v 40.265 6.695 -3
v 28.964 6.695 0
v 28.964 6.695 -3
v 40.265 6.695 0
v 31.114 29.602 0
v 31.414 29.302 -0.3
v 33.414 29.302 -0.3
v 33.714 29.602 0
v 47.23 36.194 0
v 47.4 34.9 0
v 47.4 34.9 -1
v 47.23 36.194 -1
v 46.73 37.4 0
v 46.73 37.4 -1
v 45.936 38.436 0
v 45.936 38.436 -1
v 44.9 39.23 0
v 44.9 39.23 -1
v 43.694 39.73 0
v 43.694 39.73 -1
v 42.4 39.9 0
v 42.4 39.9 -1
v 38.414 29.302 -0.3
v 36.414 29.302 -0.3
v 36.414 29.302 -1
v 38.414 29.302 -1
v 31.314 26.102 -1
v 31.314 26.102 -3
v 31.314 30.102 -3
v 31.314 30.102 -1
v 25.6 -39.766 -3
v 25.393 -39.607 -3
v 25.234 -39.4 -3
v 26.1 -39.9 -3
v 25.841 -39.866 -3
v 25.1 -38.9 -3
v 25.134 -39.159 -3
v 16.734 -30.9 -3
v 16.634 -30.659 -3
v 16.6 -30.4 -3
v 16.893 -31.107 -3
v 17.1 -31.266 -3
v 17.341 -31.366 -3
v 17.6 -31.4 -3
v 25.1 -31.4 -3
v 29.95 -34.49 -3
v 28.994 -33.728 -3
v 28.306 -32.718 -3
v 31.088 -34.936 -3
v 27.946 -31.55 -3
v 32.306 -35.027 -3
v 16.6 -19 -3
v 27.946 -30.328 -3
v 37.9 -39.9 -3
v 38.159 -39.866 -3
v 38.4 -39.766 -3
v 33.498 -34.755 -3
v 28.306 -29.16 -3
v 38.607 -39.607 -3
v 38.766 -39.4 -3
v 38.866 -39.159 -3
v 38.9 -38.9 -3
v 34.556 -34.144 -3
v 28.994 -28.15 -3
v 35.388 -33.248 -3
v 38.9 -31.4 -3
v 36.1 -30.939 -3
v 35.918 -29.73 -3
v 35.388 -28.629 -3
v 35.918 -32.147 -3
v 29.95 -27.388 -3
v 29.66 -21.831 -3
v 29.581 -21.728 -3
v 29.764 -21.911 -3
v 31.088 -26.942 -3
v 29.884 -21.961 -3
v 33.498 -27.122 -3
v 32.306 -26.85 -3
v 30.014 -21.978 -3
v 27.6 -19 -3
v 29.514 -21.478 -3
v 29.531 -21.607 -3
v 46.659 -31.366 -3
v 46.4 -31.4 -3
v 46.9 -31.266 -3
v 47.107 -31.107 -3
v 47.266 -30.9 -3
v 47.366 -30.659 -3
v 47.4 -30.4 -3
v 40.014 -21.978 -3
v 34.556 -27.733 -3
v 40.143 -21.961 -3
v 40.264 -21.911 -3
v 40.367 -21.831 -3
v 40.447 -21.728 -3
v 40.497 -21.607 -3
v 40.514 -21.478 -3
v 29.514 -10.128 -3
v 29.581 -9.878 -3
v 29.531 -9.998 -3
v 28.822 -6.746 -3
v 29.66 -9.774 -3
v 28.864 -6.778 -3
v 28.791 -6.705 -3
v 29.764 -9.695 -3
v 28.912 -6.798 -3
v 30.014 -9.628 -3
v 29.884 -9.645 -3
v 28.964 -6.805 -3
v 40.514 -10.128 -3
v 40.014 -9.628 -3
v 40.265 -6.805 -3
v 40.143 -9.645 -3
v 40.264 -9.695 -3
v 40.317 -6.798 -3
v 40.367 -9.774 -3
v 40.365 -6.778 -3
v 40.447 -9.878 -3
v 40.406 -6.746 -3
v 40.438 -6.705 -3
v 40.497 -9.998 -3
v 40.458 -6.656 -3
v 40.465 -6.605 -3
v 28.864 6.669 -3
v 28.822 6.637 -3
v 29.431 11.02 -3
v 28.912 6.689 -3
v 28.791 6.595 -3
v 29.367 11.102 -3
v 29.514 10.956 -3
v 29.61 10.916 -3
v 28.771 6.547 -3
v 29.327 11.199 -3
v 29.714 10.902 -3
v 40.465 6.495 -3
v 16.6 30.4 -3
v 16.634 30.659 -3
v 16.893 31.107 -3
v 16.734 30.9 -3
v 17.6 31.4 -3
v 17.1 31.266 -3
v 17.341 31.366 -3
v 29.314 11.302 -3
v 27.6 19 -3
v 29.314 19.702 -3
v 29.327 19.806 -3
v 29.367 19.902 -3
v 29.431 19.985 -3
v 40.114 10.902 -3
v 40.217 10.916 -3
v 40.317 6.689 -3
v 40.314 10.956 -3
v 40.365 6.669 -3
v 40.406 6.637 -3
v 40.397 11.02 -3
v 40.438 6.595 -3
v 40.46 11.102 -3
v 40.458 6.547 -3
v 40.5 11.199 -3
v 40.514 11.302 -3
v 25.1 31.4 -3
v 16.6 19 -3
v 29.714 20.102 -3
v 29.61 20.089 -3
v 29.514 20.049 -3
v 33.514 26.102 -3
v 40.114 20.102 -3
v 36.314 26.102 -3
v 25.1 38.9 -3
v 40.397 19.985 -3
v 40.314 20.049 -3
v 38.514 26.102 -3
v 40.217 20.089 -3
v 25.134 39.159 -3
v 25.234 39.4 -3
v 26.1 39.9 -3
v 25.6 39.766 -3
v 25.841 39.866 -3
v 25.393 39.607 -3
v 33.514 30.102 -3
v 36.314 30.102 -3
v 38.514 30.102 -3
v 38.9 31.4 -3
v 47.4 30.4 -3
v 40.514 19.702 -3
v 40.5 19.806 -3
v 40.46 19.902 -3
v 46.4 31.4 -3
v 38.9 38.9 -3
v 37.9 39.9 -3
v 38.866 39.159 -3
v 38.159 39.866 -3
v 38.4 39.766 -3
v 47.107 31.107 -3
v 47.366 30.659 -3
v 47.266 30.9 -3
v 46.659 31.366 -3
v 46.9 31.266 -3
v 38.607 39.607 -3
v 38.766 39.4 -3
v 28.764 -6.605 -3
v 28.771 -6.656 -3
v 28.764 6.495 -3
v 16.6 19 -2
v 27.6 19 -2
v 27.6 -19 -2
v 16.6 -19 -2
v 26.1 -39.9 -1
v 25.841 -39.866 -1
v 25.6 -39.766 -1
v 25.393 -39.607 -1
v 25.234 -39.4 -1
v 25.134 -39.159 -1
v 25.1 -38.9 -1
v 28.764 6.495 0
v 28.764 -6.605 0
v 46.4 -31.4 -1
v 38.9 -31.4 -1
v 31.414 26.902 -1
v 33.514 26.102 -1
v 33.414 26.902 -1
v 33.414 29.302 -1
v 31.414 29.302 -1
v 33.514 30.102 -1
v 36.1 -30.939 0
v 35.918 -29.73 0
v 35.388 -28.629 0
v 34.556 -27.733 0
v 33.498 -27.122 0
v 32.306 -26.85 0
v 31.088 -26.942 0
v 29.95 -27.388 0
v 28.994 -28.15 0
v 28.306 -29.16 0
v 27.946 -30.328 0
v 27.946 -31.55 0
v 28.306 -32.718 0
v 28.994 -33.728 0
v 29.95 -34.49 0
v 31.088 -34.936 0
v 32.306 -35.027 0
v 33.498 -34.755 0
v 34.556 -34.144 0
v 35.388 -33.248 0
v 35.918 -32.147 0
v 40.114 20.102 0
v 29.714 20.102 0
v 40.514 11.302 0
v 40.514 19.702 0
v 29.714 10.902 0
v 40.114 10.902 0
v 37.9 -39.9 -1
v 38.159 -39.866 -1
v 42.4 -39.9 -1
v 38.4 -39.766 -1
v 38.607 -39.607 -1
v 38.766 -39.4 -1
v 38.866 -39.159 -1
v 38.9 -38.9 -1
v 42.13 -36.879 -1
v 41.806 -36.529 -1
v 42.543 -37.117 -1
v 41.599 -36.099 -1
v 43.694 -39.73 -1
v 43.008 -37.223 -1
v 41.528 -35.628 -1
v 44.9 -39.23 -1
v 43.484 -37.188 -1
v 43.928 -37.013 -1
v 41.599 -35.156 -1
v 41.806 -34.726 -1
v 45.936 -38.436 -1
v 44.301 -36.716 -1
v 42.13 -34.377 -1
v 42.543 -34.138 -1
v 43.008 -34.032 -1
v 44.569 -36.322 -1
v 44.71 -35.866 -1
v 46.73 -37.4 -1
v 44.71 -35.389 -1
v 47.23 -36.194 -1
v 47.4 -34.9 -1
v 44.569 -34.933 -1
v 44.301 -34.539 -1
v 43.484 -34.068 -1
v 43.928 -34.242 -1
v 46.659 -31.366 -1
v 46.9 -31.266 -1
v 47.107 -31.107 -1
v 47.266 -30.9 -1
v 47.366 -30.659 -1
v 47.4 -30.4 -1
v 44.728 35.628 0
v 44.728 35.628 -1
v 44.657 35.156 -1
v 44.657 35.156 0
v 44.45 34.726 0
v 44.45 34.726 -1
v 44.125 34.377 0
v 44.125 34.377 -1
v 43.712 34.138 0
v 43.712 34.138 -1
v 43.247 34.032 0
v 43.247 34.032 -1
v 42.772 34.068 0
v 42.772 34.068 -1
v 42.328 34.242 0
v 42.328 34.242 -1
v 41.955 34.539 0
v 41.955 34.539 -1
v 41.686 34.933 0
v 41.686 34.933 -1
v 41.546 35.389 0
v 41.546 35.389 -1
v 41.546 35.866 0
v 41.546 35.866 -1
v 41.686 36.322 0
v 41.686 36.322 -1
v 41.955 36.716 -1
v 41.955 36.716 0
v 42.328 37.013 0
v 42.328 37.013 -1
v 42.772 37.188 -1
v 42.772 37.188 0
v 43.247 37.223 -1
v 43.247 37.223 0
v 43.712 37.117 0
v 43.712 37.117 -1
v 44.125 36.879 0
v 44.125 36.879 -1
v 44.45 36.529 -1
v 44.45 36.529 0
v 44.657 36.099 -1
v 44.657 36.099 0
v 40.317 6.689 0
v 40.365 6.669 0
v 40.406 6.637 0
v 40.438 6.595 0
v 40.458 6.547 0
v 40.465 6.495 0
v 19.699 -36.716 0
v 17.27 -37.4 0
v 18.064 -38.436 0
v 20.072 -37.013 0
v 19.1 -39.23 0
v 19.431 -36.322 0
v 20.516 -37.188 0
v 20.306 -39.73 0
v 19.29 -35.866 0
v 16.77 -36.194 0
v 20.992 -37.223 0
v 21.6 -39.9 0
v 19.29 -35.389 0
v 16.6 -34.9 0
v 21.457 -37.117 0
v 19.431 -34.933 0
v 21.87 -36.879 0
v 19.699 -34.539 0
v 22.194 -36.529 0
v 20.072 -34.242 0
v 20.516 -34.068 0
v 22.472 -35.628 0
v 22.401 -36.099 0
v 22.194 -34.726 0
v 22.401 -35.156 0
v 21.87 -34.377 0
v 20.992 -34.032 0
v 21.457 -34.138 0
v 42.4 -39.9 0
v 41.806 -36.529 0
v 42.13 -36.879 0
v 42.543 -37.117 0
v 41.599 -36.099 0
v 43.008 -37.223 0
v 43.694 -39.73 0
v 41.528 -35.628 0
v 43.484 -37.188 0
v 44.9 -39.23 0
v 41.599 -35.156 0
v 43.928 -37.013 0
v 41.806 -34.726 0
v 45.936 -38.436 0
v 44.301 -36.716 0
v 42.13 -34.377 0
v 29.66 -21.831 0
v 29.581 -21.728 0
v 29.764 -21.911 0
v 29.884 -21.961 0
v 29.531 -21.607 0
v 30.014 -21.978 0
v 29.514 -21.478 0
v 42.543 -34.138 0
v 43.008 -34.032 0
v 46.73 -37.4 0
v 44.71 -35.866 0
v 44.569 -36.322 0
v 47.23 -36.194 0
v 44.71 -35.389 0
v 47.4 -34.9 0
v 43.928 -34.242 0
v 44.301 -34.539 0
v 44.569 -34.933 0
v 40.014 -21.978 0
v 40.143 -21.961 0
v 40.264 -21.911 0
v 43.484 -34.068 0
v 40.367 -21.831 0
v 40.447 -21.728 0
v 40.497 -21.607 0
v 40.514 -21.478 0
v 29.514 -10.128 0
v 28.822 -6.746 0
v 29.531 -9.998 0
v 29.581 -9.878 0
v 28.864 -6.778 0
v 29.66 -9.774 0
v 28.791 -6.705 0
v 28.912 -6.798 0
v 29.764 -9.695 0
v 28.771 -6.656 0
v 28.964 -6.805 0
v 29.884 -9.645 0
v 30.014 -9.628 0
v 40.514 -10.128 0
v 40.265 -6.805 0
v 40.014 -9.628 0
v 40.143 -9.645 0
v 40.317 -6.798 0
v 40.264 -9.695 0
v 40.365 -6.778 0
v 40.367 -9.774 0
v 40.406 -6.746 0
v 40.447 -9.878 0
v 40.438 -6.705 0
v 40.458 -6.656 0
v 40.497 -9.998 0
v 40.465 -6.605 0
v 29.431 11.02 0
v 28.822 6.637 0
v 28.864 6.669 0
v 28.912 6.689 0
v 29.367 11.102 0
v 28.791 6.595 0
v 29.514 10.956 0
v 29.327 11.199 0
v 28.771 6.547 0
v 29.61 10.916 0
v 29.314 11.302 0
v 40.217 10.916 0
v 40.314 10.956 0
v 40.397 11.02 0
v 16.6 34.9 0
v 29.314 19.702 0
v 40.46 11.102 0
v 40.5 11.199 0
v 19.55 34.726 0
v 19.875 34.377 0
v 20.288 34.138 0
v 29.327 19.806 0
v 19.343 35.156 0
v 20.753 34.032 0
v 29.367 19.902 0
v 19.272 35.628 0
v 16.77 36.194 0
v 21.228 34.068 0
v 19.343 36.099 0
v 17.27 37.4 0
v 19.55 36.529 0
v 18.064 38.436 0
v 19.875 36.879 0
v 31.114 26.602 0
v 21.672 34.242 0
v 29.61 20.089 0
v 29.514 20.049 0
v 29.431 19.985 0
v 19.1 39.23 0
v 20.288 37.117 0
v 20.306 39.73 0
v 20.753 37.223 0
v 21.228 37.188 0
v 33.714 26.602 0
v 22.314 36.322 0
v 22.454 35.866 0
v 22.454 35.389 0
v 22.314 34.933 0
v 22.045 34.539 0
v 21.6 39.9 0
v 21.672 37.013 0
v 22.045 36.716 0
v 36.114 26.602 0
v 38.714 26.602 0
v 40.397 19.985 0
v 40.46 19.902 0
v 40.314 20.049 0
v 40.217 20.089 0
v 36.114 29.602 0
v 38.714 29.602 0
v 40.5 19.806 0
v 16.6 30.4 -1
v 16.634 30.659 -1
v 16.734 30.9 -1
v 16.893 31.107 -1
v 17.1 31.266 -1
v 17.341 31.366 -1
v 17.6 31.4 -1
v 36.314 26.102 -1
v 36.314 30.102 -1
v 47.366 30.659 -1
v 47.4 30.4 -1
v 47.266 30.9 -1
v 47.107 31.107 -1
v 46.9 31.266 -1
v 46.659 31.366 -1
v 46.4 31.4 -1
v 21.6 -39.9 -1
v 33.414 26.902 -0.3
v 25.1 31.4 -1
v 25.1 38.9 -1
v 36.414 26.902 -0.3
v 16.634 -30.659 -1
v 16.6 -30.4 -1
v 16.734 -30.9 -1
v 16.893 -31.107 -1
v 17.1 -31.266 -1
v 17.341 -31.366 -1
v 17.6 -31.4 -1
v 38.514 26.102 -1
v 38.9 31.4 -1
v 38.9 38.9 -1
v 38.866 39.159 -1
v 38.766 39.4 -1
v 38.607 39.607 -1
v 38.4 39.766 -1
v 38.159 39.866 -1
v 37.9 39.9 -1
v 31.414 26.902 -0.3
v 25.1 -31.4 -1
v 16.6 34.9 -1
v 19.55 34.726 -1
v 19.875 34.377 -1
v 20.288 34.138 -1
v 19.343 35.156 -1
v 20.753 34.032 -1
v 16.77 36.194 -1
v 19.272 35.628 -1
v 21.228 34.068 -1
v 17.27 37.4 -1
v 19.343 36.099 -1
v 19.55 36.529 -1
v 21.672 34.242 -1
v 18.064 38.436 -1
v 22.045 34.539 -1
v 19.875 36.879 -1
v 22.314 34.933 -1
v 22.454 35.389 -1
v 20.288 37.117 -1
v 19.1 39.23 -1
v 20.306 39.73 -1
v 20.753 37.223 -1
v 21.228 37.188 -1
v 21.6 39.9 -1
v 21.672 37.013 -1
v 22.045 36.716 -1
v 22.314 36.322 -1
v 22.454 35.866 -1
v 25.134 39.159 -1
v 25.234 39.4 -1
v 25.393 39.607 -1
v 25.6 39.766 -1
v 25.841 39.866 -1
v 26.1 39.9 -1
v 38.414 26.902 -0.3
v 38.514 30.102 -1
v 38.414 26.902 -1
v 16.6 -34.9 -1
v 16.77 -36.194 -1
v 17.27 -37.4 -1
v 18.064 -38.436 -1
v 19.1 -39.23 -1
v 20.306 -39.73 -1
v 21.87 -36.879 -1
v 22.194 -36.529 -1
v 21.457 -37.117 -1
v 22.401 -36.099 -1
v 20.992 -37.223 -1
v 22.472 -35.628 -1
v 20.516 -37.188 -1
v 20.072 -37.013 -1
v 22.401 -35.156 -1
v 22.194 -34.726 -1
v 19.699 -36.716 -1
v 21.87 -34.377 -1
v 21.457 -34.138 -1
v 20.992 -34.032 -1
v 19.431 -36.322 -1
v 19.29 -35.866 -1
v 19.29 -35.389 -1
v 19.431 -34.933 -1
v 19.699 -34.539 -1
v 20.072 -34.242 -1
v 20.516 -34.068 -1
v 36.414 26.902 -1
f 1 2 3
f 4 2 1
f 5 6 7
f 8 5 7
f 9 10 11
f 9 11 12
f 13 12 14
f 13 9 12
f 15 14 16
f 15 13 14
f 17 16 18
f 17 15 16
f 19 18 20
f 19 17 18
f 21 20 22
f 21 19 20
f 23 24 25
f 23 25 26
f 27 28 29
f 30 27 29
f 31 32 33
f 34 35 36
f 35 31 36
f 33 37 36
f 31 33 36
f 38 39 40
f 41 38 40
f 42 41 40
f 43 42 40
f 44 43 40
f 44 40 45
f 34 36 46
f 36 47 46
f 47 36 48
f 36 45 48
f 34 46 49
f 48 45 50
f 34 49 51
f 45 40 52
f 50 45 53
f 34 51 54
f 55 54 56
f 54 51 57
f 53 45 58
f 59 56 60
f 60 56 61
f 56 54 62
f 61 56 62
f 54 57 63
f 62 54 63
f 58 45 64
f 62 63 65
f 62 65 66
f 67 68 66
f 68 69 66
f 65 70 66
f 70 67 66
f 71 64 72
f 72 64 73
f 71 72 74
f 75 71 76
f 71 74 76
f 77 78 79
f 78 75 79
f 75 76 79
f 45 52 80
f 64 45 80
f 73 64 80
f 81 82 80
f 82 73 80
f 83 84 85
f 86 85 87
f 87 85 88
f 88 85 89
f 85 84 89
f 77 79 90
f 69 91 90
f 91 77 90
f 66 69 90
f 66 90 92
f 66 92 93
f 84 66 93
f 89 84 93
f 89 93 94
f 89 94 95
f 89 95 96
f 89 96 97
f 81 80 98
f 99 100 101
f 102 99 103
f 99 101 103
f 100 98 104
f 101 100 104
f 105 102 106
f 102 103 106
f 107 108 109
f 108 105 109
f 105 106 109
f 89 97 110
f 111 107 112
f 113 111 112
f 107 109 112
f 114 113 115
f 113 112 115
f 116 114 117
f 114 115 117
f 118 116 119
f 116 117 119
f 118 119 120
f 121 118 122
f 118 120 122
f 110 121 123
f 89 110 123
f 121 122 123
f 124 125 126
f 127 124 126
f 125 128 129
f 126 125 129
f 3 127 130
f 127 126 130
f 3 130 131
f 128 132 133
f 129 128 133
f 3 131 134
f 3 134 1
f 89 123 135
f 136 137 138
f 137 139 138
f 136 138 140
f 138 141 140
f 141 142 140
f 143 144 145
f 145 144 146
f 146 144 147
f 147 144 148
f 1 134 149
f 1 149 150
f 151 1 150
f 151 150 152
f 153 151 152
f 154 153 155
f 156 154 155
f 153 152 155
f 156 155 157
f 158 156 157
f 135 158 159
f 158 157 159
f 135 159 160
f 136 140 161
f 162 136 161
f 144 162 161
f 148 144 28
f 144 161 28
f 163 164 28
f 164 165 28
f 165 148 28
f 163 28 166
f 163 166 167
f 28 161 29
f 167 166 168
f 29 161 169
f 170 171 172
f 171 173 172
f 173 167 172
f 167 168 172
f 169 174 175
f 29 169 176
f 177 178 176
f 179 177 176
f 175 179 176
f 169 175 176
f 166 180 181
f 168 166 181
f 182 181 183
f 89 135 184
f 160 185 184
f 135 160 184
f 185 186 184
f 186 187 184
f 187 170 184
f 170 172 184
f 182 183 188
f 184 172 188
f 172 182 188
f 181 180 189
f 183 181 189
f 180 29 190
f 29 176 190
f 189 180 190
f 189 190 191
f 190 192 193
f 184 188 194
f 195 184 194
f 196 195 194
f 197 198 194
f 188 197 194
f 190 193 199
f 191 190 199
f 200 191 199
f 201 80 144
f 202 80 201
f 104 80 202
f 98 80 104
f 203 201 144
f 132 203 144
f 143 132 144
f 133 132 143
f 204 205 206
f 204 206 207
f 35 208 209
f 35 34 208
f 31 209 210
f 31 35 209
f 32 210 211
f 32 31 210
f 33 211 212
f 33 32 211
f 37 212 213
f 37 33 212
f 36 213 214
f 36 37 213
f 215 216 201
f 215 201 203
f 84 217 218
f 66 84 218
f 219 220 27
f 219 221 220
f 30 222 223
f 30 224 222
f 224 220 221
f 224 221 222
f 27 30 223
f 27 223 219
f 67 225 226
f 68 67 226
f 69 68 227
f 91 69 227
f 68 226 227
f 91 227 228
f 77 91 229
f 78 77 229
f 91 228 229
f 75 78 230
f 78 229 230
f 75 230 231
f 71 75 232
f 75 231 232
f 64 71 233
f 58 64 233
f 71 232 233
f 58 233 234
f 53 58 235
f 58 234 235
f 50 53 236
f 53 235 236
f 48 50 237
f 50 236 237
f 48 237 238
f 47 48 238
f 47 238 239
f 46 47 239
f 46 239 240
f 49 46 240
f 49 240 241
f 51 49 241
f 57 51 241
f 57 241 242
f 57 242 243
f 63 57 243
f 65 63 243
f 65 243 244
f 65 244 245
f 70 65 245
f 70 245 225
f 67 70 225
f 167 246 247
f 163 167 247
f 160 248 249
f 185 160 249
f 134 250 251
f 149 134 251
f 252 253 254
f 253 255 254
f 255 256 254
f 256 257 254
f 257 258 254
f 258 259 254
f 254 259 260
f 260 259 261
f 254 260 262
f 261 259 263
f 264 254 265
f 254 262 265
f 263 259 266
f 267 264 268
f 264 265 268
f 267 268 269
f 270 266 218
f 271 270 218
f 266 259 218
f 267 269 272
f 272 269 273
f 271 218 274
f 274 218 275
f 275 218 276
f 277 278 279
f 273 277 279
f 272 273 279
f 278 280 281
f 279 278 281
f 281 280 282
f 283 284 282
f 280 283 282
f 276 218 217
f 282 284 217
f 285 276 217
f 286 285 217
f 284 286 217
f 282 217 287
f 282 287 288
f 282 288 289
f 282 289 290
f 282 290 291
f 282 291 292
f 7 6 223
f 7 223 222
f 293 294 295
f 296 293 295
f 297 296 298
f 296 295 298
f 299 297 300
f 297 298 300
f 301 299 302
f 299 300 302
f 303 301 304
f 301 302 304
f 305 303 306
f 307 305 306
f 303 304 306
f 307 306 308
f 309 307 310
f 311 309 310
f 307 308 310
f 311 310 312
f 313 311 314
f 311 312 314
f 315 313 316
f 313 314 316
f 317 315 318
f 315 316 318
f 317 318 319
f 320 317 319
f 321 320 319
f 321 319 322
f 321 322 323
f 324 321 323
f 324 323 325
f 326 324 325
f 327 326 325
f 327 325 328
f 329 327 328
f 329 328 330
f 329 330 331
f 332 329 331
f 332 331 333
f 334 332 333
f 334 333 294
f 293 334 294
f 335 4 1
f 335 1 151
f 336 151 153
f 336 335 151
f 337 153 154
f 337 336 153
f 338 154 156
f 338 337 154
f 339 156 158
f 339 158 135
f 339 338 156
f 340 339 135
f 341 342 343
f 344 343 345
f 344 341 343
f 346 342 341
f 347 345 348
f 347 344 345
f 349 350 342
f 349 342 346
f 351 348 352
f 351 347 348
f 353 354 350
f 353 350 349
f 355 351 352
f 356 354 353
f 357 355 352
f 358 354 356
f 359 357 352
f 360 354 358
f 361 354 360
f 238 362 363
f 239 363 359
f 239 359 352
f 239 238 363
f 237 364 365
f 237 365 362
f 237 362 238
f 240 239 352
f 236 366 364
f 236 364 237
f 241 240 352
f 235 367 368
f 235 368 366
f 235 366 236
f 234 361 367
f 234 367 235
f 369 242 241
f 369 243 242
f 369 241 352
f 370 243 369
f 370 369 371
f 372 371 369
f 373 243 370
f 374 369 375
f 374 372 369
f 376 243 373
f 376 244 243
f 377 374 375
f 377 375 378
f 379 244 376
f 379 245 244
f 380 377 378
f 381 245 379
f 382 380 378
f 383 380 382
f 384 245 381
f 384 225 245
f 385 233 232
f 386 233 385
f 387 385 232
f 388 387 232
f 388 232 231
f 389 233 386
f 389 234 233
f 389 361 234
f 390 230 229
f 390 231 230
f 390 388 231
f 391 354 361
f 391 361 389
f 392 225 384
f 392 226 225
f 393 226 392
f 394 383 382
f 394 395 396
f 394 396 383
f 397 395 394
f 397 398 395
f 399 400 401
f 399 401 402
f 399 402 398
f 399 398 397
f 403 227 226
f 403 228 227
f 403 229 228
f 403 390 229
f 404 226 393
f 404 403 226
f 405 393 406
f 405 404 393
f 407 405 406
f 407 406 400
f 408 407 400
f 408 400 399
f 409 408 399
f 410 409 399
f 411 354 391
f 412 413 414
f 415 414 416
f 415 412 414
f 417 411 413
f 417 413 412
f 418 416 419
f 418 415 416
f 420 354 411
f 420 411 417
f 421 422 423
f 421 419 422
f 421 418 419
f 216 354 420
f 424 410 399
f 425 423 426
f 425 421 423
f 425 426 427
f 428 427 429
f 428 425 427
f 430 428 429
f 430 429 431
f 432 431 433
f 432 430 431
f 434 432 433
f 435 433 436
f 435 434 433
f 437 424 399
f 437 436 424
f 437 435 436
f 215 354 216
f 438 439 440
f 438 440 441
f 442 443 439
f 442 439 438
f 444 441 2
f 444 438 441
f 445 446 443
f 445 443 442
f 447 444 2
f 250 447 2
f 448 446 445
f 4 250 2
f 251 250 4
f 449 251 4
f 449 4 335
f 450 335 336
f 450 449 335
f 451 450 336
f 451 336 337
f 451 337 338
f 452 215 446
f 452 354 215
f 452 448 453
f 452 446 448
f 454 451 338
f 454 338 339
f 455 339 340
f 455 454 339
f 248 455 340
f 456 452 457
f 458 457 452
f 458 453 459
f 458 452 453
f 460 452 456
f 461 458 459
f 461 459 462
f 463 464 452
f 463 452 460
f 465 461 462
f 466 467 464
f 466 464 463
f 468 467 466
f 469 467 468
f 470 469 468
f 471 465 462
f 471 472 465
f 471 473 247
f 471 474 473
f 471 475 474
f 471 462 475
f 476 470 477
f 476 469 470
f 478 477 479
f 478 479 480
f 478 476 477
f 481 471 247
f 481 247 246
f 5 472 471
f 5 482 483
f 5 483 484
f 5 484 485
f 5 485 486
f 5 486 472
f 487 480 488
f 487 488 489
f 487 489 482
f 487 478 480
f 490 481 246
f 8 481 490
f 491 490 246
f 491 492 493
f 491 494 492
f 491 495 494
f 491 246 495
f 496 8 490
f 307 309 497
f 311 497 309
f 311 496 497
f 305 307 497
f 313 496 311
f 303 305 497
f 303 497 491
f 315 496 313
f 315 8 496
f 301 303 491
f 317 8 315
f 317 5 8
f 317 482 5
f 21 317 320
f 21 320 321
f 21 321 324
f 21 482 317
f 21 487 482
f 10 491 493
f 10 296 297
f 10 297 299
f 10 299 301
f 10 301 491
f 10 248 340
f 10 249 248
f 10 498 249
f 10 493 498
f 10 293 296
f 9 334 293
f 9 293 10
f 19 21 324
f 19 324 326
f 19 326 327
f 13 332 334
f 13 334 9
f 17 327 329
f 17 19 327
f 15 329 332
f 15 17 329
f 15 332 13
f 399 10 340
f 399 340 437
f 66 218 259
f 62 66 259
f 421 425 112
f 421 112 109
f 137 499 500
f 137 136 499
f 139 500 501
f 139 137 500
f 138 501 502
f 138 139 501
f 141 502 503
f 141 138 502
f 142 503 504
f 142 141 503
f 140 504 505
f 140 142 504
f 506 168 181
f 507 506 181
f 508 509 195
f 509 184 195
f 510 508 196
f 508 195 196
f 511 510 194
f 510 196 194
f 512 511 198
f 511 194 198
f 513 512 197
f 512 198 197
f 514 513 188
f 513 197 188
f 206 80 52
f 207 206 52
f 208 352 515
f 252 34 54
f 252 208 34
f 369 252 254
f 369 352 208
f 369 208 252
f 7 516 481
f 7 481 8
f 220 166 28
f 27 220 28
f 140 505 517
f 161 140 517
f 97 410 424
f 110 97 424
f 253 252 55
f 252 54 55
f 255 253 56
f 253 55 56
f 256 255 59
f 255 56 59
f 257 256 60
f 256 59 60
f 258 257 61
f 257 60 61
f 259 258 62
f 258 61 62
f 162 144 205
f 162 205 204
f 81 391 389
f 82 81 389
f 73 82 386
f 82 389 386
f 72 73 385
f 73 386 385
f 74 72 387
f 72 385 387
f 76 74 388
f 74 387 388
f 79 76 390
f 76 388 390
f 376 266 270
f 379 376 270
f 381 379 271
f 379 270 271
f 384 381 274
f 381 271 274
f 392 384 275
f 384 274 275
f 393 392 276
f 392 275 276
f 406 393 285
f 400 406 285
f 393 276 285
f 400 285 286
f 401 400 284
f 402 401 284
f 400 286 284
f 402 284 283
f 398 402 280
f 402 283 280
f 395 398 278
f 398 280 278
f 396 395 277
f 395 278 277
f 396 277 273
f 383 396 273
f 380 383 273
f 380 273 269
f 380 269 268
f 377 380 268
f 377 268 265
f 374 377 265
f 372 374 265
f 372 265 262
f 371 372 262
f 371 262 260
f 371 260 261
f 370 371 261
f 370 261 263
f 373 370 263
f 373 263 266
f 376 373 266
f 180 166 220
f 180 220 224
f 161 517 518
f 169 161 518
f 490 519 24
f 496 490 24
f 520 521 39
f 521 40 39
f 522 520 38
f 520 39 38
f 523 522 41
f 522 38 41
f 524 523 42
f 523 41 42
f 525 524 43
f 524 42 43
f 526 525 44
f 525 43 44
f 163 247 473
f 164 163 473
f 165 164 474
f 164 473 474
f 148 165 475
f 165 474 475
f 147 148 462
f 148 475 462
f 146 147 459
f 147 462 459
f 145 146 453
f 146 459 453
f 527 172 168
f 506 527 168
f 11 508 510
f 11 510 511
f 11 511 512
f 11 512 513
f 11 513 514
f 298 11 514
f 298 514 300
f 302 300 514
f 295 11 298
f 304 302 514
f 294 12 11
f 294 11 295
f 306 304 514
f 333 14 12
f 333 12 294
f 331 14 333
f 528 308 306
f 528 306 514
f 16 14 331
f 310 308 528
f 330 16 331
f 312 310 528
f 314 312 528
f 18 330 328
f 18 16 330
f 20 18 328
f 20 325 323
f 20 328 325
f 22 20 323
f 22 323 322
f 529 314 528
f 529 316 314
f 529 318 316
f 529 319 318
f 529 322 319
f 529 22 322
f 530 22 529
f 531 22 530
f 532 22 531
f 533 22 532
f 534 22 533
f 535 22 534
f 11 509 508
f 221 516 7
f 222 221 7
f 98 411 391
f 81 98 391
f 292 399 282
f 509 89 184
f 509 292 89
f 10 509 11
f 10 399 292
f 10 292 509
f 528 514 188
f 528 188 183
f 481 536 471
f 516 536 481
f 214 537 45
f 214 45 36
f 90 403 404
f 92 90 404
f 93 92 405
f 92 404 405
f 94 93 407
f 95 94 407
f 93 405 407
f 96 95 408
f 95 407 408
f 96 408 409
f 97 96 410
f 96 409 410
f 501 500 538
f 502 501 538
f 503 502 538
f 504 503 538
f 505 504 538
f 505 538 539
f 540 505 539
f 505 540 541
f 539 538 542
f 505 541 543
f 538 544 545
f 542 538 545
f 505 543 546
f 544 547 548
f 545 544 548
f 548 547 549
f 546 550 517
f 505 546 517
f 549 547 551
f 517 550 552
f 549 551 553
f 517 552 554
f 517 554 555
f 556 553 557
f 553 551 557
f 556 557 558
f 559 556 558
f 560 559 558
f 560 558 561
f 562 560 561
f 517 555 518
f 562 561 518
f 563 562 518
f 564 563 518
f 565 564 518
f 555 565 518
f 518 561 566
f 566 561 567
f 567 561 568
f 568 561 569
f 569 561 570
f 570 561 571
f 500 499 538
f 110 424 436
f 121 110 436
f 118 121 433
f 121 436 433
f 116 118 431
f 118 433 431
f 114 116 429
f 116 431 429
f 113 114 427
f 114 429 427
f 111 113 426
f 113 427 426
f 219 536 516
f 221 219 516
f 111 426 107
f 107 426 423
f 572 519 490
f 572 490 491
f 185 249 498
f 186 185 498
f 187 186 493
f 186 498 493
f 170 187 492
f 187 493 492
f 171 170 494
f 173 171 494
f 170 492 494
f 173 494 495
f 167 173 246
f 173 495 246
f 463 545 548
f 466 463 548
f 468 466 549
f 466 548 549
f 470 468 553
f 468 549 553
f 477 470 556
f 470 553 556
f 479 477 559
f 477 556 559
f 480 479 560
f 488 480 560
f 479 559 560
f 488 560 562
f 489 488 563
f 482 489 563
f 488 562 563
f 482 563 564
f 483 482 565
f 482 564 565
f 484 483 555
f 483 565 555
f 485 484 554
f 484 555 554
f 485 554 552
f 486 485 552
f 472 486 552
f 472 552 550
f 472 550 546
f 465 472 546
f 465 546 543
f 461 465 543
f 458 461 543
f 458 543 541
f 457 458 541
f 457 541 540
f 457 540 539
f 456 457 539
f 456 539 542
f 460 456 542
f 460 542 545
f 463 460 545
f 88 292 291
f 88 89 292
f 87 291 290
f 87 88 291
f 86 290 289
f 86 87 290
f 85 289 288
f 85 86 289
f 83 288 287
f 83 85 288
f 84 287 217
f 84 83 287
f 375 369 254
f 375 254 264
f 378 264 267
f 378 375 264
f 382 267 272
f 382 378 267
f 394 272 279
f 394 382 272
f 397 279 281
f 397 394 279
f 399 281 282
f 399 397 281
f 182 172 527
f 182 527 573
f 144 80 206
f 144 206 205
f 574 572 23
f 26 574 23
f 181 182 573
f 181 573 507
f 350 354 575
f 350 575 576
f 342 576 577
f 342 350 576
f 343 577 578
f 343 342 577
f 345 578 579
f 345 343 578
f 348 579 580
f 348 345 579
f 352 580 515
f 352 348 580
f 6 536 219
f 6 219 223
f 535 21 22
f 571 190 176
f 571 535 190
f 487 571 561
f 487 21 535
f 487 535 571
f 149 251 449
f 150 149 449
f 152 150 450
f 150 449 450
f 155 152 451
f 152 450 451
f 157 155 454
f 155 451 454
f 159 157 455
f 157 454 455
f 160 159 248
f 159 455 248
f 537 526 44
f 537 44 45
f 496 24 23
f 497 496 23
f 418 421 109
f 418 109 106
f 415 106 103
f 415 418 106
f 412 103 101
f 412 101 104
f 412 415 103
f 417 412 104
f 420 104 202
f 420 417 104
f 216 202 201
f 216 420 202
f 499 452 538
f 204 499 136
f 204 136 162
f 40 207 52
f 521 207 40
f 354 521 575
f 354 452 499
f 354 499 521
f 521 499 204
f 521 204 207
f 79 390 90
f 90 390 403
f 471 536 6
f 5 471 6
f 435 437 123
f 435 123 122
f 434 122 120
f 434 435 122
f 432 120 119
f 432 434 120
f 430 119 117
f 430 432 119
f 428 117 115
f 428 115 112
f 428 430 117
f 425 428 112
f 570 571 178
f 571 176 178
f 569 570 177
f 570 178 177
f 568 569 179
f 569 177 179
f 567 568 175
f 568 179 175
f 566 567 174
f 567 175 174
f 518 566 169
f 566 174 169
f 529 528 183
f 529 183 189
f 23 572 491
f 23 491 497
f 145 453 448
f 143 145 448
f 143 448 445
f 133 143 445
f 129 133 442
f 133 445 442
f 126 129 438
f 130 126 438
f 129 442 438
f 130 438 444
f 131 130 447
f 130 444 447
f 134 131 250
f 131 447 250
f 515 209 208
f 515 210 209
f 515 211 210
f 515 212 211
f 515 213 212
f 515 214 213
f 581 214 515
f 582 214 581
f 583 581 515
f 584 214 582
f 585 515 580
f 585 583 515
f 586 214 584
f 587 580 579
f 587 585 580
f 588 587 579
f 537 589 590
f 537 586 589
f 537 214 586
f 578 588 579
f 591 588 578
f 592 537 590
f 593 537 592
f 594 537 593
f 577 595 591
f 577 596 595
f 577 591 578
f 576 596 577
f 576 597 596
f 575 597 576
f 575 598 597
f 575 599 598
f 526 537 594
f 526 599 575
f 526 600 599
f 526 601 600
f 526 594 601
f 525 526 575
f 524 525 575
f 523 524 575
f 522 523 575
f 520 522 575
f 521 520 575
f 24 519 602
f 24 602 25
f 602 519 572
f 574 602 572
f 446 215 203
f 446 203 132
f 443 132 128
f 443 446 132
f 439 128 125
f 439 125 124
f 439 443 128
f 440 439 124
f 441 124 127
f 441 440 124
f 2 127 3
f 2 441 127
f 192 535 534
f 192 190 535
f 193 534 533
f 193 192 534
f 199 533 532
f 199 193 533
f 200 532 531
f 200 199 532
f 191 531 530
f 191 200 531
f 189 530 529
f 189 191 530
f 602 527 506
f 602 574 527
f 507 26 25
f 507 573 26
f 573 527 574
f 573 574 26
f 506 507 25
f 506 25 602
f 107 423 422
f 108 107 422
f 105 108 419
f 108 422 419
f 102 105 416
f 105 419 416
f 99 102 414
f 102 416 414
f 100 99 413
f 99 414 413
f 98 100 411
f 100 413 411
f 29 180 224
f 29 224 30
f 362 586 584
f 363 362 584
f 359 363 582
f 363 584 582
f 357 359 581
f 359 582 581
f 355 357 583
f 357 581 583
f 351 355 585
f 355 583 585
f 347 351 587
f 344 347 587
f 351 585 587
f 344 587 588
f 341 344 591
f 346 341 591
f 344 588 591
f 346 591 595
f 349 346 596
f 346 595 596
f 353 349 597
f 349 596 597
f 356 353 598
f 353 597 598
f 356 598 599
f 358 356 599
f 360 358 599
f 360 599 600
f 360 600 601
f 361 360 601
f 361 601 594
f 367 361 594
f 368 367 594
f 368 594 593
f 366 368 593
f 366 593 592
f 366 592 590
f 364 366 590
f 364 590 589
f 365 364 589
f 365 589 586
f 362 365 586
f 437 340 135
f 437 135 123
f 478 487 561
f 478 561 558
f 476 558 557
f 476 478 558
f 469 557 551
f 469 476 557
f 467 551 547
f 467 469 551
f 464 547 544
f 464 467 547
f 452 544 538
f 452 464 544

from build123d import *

# Parameters (mm, degrees)
SKETCH_1_W          = 2
SKETCH_1_H          = 2.4
EXTRUDE_1_DEPTH     = 3
SKETCH_2_W          = 11
SKETCH_2_H          = 38
CUT_EXTRUDE_1_DEPTH = 1
CUT_EXTRUDE_START   = -2
CUT_EXTRUDE_2_DEPTH = 2
SKETCH_4_R          = 1.6
CUT_EXTRUDE_3_DEPTH = 62.990079852
SKETCH_6_W          = 2.2
SKETCH_6_H          = 4
CUT_EXTRUDE_4_DEPTH = 2
SKETCH_7_R          = 4.1
CUT_EXTRUDE_5_DEPTH = 63.030395775
FILLET_1_R          = 1
CHAMFER_1_SIZE      = 0.3


with BuildPart() as part:
    # 草图1 → 凸台-拉伸1 (new body)
    with BuildSketch(Plane.XY):
        with BuildLine():
            Line((47.4, -34.9), (47.4, 34.9))
            ThreePointArc((47.4, 34.9), (45.935533906, 38.435533906), (42.4, 39.9))
            Line((42.4, 39.9), (21.6, 39.9))
            ThreePointArc((21.6, 39.9), (18.064466094, 38.435533906), (16.6, 34.9))
            Line((16.6, 34.9), (16.6, -34.9))
            ThreePointArc((16.6, -34.9), (18.064466094, -38.435533906), (21.6, -39.9))
            Line((21.6, -39.9), (42.4, -39.9))
            ThreePointArc((42.4, -39.9), (45.935533906, -38.435533906), (47.4, -34.9))
        make_face()
        with Locations((32.413843028, 28.102429875)):
            Rectangle(SKETCH_1_W, SKETCH_1_H, mode=Mode.SUBTRACT)
        with BuildLine():
            Line((40.513850359, -21.477641558), (40.513850359, -10.127641653))
            ThreePointArc((40.513850359, -10.127641653), (40.367403749, -9.774088262), (40.013850359, -9.627641653))
            Line((40.013850359, -9.627641653), (30.013850359, -9.627641653))
            ThreePointArc((30.013850359, -9.627641653), (29.660296968, -9.774088262), (29.513850359, -10.127641653))
            Line((29.513850359, -10.127641653), (29.513850359, -21.477641558))
            ThreePointArc((29.513850359, -21.477641558), (29.660296968, -21.831194949), (30.013850359, -21.977641558))
            Line((30.013850359, -21.977641558), (40.013850359, -21.977641558))
            ThreePointArc((40.013850359, -21.977641558), (40.367403749, -21.831194949), (40.513850359, -21.477641558))
        make_face(mode=Mode.SUBTRACT)
        with Locations((37.413843028, 28.102429875)):
            Rectangle(SKETCH_1_W, SKETCH_1_H, mode=Mode.SUBTRACT)
        with BuildLine():
            Line((40.464996896, 6.495389649), (40.464996896, -6.604609867))
            ThreePointArc((40.464996896, -6.604609867), (40.406418252, -6.746031223), (40.264996896, -6.804609867))
            Line((40.264996896, -6.804609867), (28.963873947, -6.804609867))
            ThreePointArc((28.963873947, -6.804609867), (28.822452591, -6.746031223), (28.763873947, -6.604609867))
            Line((28.763873947, -6.604609867), (28.763873947, 6.495389649))
            ThreePointArc((28.763873947, 6.495389649), (28.822452591, 6.636811005), (28.963873947, 6.695389649))
            Line((28.963873947, 6.695389649), (40.264996896, 6.695389649))
            ThreePointArc((40.264996896, 6.695389649), (40.406418252, 6.636811005), (40.464996896, 6.495389649))
        make_face(mode=Mode.SUBTRACT)
        with BuildLine():
            Line((40.513843009, 11.302412116), (40.513843009, 19.702429875))
            ThreePointArc((40.513843009, 19.702429875), (40.396685721, 19.985272588), (40.113843009, 20.102429875))
            Line((40.113843009, 20.102429875), (29.713821303, 20.102429875))
            ThreePointArc((29.713821303, 20.102429875), (29.43097859, 19.985272588), (29.313821303, 19.702429875))
            Line((29.313821303, 19.702429875), (29.313821303, 11.302412116))
            ThreePointArc((29.313821303, 11.302412116), (29.43097859, 11.019569403), (29.713821303, 10.902412116))
            Line((29.713821303, 10.902412116), (40.113843009, 10.902412116))
            ThreePointArc((40.113843009, 10.902412116), (40.396685721, 11.019569403), (40.513843009, 11.302412116))
        make_face(mode=Mode.SUBTRACT)
    extrude(amount=-EXTRUDE_1_DEPTH)

    # 草图2 → 切除-拉伸1 (cut)
    with BuildSketch(Plane(origin=(0, 0, -3), x_dir=(-1, 0, 0), z_dir=(0, 0, -1))):
        with Locations((-22.1, 0)):
            Rectangle(SKETCH_2_W, SKETCH_2_H)
    extrude(amount=-CUT_EXTRUDE_1_DEPTH, mode=Mode.SUBTRACT)

    # 草图3 → 切除-拉伸2 (cut)
    with BuildSketch(Plane(origin=(0, 0, -3), x_dir=(-1, 0, 0), z_dir=(0, 0, -1)).offset(CUT_EXTRUDE_START)):
        with BuildLine():
            Line((-47.4, -31.4), (-38.9, -31.4))
            Line((-38.9, -31.4), (-38.9, -39.9))
            Line((-38.9, -39.9), (-42.4, -39.9))
            ThreePointArc((-42.4, -39.9), (-45.935533906, -38.435533906), (-47.4, -34.9))
            Line((-47.4, -34.9), (-47.4, -31.4))
        make_face()
        with BuildLine():
            Line((-47.4, 34.9), (-47.4, 31.4))
            Line((-47.4, 31.4), (-38.9, 31.4))
            Line((-38.9, 31.4), (-38.9, 39.9))
            Line((-38.9, 39.9), (-42.4, 39.9))
            ThreePointArc((-42.4, 39.9), (-45.935533906, 38.435533906), (-47.4, 34.9))
        make_face()
        with BuildLine():
            Line((-16.6, 31.4), (-25.1, 31.4))
            Line((-25.1, 31.4), (-25.1, 39.9))
            Line((-25.1, 39.9), (-21.6, 39.9))
            ThreePointArc((-21.6, 39.9), (-18.064466094, 38.435533906), (-16.6, 34.9))
            Line((-16.6, 34.9), (-16.6, 31.4))
        make_face()
        with BuildLine():
            Line((-16.6, -34.9), (-16.6, -31.4))
            Line((-16.6, -31.4), (-25.1, -31.4))
            Line((-25.1, -31.4), (-25.1, -39.9))
            Line((-25.1, -39.9), (-21.6, -39.9))
            ThreePointArc((-21.6, -39.9), (-18.064466094, -38.435533906), (-16.6, -34.9))
        make_face()
    extrude(amount=CUT_EXTRUDE_2_DEPTH, mode=Mode.SUBTRACT)

    # 草图4 → 切除-拉伸3 (cut, through all)
    with BuildSketch(Plane(origin=(0, 0, -1), x_dir=(-1, 0, 0), z_dir=(0, 0, -1))):
        with Locations((-20.872307757, 35.627692243)):
            Circle(SKETCH_4_R)
        with Locations(Location((-20.872307757, -35.627692243, 0), (0, 0, 180))):
            Circle(SKETCH_4_R)
        with Locations((-43.127692243, -35.627692243)):
            Circle(SKETCH_4_R)
        with Locations(Location((-43.127692243, 35.627692243, 0), (0, 0, 180))):
            Circle(SKETCH_4_R)
    extrude(amount=-CUT_EXTRUDE_3_DEPTH, mode=Mode.SUBTRACT)

    # 草图6 → 切除-拉伸4 (cut)
    with BuildSketch(Plane(origin=(0, 0, -3), x_dir=(-1, 0, 0), z_dir=(0, 0, -1))):
        with Locations((-37.413843028, 28.102429875)):
            Rectangle(SKETCH_6_W, SKETCH_6_H)
        with Locations((-32.413843028, 28.102429875)):
            Rectangle(SKETCH_6_W, SKETCH_6_H)
    extrude(amount=-CUT_EXTRUDE_4_DEPTH, mode=Mode.SUBTRACT)

    # 草图7 → 切除-拉伸5 (cut, through all)
    with BuildSketch(Plane.XY):
        with Locations((32, -30.938820779)):
            Circle(SKETCH_7_R)
    extrude(amount=-CUT_EXTRUDE_5_DEPTH, mode=Mode.SUBTRACT)

    # 圆角1
    fillet_1_edges = [part.edges().sort_by_distance(p)[0] for p in [
        (25.1, -39.9, -2),
        (16.6, -31.4, -2),
        (16.6, 31.4, -2),
        (25.1, 39.9, -2),
        (38.9, 39.9, -2),
        (47.4, 31.4, -2),
        (47.4, -31.4, -2),
        (38.9, -39.9, -2),
    ]]
    fillet(fillet_1_edges, radius=FILLET_1_R)

    # 倒角1
    chamfer_1_edges = [part.edges().sort_by_distance(p)[0] for p in [
        (36.413843028, 28.102429875, 0),
        (37.413843028, 26.902429875, 0),
        (38.413843028, 28.102429875, 0),
        (37.413843028, 29.302429875, 0),
        (32.413843028, 29.302429875, 0),
        (31.413843028, 28.102429875, 0),
        (32.413843028, 26.902429875, 0),
        (33.413843028, 28.102429875, 0),
    ]]
    chamfer(chamfer_1_edges, length=CHAMFER_1_SIZE)


solid = part.part
